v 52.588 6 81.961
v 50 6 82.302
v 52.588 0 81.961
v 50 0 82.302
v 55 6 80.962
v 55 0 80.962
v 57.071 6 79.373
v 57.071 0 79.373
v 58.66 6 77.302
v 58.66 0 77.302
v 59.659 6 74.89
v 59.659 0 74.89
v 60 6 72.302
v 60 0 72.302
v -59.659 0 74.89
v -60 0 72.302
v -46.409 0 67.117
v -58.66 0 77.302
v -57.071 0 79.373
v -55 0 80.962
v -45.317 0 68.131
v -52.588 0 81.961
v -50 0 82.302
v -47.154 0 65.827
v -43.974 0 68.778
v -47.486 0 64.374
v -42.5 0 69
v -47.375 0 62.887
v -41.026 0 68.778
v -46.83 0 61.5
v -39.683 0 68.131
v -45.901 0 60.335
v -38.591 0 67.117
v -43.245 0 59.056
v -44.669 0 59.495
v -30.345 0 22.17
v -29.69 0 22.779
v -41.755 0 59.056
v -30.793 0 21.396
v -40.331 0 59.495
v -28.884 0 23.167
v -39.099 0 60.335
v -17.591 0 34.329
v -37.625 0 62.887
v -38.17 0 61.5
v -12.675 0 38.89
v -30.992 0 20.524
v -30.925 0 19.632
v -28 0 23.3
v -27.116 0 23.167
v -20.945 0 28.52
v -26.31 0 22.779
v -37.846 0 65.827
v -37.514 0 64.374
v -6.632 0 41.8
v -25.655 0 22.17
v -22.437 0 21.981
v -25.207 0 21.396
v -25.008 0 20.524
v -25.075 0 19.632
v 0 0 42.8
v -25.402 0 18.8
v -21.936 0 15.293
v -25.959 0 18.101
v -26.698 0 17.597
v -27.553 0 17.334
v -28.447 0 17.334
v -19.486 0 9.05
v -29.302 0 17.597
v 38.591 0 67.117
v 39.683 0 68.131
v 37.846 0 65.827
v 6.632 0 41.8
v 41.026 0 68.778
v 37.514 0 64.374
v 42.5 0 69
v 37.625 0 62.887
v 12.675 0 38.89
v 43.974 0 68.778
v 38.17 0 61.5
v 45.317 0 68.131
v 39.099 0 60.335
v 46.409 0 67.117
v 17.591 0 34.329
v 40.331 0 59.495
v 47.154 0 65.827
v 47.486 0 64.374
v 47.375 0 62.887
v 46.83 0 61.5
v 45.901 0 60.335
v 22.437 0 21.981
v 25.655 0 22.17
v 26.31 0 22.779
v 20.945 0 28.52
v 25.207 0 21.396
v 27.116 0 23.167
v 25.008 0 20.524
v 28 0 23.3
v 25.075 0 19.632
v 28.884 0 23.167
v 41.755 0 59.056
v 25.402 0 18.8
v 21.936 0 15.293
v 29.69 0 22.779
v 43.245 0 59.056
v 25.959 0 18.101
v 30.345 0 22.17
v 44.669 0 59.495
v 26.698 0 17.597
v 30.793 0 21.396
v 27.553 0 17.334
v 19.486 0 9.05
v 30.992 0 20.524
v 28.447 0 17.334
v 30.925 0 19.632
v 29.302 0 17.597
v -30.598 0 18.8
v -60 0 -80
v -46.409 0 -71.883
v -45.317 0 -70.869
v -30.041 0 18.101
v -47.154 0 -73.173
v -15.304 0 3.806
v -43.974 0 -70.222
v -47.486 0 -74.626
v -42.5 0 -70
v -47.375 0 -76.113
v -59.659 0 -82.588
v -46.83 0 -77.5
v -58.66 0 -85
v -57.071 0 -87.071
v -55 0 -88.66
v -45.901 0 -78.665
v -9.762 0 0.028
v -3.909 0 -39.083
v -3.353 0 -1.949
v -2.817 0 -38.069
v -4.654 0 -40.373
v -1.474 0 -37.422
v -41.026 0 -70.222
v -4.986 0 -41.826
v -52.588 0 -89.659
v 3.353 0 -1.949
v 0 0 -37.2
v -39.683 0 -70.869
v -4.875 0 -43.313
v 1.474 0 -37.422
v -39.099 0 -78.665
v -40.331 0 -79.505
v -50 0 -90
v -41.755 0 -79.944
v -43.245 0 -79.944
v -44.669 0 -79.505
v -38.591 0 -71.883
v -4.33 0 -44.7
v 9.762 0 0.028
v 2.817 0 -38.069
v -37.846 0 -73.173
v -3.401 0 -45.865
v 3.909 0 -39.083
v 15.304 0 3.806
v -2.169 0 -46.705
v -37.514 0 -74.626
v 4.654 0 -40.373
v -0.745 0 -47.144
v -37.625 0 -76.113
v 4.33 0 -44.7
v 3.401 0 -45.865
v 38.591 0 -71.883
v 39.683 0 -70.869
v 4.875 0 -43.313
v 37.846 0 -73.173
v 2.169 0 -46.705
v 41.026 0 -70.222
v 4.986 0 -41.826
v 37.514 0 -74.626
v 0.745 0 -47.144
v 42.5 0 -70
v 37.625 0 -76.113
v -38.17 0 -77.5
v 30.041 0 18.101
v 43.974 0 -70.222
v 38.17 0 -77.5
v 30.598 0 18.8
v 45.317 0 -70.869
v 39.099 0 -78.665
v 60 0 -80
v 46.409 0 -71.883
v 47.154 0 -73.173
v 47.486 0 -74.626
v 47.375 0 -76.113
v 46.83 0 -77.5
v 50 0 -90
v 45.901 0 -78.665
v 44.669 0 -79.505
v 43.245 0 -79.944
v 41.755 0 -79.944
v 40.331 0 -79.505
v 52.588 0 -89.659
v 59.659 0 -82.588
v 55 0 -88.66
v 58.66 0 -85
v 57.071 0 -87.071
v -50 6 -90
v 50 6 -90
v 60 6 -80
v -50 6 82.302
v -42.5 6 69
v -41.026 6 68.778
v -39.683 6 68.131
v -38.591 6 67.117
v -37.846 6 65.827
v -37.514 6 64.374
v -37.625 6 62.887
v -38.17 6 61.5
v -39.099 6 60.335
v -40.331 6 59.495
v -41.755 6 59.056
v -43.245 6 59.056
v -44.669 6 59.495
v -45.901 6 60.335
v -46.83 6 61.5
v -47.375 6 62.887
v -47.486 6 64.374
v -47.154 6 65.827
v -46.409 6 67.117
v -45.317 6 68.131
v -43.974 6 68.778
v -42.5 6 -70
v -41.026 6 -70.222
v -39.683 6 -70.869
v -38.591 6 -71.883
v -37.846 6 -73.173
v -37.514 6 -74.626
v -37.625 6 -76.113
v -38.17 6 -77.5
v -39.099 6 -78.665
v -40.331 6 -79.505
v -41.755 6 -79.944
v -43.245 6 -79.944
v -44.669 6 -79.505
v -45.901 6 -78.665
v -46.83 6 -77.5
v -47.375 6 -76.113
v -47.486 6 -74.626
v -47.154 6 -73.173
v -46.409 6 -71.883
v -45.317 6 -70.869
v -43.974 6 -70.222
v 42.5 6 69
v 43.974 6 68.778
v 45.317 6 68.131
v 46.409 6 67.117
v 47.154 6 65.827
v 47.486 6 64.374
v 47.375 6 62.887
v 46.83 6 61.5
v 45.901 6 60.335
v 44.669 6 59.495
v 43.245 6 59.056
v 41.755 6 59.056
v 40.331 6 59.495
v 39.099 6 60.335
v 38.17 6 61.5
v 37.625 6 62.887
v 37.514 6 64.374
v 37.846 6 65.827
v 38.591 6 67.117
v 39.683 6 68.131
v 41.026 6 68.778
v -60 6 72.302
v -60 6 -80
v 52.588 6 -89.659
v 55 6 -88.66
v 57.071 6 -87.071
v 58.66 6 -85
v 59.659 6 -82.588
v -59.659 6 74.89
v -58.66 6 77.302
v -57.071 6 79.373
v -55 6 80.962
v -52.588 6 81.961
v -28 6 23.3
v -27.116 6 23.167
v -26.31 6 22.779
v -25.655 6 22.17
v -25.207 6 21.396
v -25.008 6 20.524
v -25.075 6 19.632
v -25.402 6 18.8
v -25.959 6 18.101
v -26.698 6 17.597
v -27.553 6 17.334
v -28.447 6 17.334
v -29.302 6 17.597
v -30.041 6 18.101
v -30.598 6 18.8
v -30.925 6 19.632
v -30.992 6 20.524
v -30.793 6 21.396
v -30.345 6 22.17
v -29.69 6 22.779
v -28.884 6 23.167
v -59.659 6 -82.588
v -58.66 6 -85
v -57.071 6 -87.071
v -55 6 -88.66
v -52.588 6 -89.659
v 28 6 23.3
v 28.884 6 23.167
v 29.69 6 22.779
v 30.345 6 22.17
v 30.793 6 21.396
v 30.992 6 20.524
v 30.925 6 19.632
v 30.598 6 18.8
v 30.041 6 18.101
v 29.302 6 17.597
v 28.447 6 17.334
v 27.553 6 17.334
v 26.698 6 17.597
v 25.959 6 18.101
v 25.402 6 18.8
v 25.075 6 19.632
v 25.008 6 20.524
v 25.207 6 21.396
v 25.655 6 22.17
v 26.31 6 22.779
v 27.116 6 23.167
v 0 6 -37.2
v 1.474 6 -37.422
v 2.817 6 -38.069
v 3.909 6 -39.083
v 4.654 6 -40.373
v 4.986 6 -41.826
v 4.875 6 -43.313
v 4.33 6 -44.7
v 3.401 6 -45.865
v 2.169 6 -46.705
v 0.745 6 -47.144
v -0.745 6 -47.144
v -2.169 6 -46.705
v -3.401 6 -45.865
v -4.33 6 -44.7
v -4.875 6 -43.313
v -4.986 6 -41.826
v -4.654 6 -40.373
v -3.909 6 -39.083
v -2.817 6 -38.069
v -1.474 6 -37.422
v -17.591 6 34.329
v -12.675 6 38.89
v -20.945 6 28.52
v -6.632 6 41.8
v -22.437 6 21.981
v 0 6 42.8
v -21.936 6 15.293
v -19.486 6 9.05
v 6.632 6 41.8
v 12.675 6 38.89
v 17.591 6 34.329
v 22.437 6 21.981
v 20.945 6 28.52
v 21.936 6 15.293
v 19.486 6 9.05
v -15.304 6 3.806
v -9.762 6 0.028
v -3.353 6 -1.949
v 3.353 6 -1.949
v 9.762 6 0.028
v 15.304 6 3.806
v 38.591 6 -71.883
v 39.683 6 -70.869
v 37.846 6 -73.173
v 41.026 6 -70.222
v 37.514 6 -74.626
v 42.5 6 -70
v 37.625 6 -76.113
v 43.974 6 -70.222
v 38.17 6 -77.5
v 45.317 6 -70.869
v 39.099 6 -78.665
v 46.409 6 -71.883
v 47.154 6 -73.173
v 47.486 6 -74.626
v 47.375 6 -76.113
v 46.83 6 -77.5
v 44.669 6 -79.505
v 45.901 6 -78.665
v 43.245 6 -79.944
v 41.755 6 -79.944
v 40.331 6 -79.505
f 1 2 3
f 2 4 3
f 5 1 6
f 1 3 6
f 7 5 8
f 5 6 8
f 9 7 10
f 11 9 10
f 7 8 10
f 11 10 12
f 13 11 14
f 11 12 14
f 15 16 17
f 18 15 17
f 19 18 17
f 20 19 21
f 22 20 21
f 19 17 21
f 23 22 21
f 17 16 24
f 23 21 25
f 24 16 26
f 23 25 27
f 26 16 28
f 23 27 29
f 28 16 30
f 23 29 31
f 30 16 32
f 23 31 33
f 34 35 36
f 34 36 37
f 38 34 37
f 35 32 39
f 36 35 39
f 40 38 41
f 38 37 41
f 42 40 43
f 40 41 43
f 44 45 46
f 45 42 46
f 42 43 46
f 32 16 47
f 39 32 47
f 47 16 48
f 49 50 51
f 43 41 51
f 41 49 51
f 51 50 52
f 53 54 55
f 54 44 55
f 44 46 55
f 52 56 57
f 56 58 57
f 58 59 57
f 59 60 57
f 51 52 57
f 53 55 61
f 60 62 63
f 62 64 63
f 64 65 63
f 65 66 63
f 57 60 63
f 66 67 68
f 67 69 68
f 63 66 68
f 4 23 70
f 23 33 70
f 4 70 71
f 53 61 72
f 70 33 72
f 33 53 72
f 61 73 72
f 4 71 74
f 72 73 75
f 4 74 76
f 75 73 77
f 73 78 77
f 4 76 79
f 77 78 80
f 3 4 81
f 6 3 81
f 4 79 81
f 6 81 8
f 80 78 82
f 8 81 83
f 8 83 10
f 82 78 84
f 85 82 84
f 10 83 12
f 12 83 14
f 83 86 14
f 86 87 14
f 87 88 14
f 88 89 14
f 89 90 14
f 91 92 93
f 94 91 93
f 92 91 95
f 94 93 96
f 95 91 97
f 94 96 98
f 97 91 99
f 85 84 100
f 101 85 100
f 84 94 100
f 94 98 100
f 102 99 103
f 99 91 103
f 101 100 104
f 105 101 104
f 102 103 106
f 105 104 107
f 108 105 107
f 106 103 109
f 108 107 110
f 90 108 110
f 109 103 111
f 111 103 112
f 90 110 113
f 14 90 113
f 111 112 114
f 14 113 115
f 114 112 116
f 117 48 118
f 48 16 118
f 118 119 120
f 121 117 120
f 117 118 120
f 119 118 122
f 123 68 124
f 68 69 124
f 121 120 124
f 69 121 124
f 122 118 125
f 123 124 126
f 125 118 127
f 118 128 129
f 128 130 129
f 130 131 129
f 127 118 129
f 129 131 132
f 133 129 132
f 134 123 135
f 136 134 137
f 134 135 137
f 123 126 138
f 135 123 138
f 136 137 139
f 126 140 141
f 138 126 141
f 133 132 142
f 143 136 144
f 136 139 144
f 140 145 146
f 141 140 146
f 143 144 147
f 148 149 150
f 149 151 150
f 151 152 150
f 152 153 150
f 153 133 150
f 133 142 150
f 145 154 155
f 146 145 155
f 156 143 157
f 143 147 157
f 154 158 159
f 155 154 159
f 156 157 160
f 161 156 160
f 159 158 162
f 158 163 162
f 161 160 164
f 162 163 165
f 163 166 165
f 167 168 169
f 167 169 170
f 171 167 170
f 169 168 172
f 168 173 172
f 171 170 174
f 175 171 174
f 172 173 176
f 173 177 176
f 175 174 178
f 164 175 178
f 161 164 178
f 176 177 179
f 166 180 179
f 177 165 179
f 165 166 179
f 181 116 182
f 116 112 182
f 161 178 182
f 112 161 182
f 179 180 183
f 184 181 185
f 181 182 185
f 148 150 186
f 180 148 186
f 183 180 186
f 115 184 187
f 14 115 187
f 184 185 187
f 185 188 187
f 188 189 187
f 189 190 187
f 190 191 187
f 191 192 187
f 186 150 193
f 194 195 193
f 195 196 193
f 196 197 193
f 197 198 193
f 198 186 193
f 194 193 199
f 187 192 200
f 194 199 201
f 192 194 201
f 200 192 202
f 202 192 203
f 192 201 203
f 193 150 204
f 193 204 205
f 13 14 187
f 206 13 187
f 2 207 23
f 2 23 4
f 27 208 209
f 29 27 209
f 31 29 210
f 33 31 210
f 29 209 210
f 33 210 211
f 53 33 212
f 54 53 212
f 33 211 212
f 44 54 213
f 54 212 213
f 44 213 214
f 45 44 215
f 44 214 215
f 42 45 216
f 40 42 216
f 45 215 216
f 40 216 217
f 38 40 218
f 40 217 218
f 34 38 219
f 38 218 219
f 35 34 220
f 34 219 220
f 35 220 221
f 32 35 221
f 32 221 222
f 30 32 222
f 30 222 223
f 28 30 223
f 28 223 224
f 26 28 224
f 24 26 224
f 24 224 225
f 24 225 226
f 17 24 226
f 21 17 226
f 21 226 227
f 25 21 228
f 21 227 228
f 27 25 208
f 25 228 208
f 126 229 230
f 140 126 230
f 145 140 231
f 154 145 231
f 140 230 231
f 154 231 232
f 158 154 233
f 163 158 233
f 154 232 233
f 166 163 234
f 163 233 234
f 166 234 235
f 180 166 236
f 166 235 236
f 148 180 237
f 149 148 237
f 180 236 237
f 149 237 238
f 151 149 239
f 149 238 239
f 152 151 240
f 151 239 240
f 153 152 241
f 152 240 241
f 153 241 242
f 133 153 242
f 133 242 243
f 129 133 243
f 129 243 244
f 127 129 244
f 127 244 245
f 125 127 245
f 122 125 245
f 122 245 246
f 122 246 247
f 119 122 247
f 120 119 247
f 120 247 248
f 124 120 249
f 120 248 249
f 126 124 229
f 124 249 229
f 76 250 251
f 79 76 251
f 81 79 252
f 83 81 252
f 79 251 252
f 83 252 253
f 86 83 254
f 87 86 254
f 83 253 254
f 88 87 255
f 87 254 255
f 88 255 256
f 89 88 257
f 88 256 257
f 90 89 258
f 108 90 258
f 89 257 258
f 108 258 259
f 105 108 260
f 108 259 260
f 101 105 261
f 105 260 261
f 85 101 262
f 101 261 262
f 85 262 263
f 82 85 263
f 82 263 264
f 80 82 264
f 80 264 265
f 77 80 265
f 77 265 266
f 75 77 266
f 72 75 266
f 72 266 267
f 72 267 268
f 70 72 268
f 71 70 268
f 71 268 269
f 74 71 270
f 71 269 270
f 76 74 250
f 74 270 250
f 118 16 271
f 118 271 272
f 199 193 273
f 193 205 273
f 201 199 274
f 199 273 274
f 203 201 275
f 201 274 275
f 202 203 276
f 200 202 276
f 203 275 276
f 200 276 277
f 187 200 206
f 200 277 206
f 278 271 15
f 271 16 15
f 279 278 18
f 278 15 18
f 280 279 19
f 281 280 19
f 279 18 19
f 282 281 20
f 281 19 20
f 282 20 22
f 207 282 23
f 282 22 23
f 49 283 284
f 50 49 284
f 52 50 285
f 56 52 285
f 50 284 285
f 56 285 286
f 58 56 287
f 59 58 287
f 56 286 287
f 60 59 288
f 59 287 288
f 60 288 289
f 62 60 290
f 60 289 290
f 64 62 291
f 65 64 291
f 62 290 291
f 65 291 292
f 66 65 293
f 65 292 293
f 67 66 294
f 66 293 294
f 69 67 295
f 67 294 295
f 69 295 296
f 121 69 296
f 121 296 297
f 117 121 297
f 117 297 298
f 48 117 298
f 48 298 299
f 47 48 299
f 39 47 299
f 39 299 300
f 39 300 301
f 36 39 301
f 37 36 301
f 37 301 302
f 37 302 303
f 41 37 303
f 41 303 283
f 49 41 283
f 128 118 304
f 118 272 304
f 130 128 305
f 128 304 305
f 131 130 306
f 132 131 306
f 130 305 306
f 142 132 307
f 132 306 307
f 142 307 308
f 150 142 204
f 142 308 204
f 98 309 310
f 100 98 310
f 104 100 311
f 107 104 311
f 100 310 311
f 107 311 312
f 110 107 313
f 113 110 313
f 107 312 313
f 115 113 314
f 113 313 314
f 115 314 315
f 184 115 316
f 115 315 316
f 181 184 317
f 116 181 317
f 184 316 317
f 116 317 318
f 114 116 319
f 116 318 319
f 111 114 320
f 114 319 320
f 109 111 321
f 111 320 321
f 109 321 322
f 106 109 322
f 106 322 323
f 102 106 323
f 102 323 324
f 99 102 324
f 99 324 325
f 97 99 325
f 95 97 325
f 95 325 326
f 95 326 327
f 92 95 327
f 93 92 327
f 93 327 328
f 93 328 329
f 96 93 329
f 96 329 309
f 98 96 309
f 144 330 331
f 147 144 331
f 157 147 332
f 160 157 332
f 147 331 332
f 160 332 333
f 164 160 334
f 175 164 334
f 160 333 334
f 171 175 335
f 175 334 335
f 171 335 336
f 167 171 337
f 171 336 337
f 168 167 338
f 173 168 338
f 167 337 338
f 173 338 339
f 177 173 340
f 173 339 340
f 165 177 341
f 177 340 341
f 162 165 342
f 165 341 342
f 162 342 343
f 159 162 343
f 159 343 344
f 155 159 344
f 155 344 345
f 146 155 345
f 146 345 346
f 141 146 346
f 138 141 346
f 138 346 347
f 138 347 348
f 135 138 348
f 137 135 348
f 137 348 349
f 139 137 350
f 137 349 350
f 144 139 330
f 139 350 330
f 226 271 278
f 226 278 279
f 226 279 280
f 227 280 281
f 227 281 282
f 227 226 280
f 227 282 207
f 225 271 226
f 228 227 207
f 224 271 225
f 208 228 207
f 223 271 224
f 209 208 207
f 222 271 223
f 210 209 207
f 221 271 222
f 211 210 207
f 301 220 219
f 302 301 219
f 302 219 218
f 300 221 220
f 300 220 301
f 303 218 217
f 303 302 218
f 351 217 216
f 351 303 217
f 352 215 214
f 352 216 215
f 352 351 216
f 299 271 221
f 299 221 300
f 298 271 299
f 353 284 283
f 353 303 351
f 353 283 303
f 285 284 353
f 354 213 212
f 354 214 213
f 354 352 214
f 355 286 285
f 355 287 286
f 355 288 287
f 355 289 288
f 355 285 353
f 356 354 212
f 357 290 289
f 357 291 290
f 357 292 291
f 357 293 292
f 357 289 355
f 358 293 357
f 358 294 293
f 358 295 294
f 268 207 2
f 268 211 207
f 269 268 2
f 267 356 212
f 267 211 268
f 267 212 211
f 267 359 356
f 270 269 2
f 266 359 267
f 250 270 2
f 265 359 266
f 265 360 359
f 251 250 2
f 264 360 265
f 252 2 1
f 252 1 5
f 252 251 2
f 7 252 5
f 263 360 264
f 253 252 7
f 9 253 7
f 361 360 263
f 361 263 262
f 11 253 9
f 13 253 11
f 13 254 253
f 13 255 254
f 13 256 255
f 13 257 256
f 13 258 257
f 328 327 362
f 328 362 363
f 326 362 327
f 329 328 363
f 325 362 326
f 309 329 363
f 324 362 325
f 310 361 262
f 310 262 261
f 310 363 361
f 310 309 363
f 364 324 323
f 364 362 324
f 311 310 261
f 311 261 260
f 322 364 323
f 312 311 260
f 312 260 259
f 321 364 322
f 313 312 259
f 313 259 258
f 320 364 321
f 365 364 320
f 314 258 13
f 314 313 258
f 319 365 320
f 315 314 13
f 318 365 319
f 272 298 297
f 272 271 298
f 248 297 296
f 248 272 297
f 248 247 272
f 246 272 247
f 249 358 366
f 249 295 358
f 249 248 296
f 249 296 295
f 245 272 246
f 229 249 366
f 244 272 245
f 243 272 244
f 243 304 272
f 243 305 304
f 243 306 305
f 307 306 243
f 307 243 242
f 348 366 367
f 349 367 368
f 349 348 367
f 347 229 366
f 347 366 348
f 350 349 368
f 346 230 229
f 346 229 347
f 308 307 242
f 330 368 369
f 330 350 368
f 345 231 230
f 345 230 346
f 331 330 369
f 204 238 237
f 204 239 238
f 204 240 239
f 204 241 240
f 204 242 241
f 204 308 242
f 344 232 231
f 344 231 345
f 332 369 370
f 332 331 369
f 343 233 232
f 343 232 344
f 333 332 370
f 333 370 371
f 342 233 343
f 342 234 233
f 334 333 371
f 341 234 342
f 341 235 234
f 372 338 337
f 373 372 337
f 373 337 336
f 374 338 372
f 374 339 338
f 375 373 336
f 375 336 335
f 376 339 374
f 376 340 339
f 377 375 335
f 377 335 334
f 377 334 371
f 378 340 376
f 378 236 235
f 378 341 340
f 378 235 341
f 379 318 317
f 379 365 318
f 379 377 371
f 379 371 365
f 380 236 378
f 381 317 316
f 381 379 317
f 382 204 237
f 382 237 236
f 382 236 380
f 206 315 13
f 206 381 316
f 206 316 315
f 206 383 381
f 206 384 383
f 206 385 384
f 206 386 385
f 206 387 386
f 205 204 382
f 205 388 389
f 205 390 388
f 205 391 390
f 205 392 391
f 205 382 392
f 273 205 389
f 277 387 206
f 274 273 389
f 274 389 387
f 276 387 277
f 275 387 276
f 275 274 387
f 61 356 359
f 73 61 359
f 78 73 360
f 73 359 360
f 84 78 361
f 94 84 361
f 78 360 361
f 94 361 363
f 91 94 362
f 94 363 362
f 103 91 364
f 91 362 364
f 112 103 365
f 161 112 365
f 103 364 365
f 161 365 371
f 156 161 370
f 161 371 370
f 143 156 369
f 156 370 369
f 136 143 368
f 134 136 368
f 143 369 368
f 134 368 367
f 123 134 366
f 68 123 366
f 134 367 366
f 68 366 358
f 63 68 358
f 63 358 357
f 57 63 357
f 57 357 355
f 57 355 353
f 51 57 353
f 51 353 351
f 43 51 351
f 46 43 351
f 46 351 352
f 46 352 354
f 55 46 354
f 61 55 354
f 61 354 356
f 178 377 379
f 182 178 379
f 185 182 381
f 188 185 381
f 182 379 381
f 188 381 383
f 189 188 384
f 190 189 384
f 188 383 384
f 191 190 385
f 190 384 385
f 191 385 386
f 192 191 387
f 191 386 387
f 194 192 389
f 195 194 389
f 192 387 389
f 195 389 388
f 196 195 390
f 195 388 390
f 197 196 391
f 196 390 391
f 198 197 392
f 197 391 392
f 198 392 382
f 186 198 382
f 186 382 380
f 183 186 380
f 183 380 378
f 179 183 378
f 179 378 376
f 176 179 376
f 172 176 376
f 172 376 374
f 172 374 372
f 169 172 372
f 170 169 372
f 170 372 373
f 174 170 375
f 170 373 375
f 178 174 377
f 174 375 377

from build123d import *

# Parameters (mm, degrees)
SKETCH1_W           = 120
SKETCH1_H           = 180
BOSS_EXTRUDE1_DEPTH = 6
SKETCH2_R           = 5
CUT_EXTRUDE1_DEPTH  = 6
SKETCH4_R           = 22.5
SKETCH4_R_2         = 3
CUT_EXTRUDE3_DEPTH  = 10
SKETCH5_W           = 120
SKETCH5_H           = 7.698004818
CUT_EXTRUDE4_DEPTH  = 10
FILLET1_R           = 10


with BuildPart() as part:
    # Sketch1 → Boss-Extrude1 (new body)
    with BuildSketch(Plane(origin=(0, 0, 0), x_dir=(1, 0, 0), z_dir=(0, 1, 0))):
        Rectangle(SKETCH1_W, SKETCH1_H)
    extrude(amount=BOSS_EXTRUDE1_DEPTH)

    # Sketch2 → Cut-Extrude1 (cut)
    with BuildSketch(Plane(origin=(0, 6, 0), x_dir=(1, 0, 0), z_dir=(0, 1, 0))):
        with Locations(Location((-42.5, 75, 0), (0, 0, 270))):
            Circle(SKETCH2_R)
        with Locations(Location((42.5, 75, 0), (0, 0, 270))):
            Circle(SKETCH2_R)
        with Locations(Location((-42.5, -64, 0), (0, 0, 270))):
            Circle(SKETCH2_R)
        with Locations(Location((42.5, -64, 0), (0, 0, 270))):
            Circle(SKETCH2_R)
        with Locations(Location((0, 42.2, 0), (0, 0, 270))):
            Circle(SKETCH2_R)
    extrude(amount=-CUT_EXTRUDE1_DEPTH, mode=Mode.SUBTRACT)

    # Sketch4 → Cut-Extrude3 (cut)
    with BuildSketch(Plane(origin=(0, 6, 0), x_dir=(1, 0, 0), z_dir=(0, 1, 0))):
        with Locations(Location((0, -20.3, 0), (0, 0, 270))):
            Circle(SKETCH4_R)
        with Locations(Location((-28, -20.3, 0), (0, 0, 270))):
            Circle(SKETCH4_R_2)
        with Locations(Location((28, -20.3, 0), (0, 0, 270))):
            Circle(SKETCH4_R_2)
    extrude(amount=-CUT_EXTRUDE3_DEPTH, mode=Mode.SUBTRACT)

    # Sketch5 → Cut-Extrude4 (cut)
    with BuildSketch(Plane(origin=(0, 6, 0), x_dir=(1, 0, 0), z_dir=(0, 1, 0))):
        with Locations((0, -86.150997591)):
            Rectangle(SKETCH5_W, SKETCH5_H)
    extrude(amount=-CUT_EXTRUDE4_DEPTH, mode=Mode.SUBTRACT)

    # Fillet1
    fillet1_edges = [part.edges().sort_by_distance(p)[0] for p in [
        (-60, 3, 82.301995182),
        (60, 3, 82.301995182),
        (-60, 3, -90),
        (60, 3, -90),
    ]]
    fillet(fillet1_edges, radius=FILLET1_R)


solid = part.part
